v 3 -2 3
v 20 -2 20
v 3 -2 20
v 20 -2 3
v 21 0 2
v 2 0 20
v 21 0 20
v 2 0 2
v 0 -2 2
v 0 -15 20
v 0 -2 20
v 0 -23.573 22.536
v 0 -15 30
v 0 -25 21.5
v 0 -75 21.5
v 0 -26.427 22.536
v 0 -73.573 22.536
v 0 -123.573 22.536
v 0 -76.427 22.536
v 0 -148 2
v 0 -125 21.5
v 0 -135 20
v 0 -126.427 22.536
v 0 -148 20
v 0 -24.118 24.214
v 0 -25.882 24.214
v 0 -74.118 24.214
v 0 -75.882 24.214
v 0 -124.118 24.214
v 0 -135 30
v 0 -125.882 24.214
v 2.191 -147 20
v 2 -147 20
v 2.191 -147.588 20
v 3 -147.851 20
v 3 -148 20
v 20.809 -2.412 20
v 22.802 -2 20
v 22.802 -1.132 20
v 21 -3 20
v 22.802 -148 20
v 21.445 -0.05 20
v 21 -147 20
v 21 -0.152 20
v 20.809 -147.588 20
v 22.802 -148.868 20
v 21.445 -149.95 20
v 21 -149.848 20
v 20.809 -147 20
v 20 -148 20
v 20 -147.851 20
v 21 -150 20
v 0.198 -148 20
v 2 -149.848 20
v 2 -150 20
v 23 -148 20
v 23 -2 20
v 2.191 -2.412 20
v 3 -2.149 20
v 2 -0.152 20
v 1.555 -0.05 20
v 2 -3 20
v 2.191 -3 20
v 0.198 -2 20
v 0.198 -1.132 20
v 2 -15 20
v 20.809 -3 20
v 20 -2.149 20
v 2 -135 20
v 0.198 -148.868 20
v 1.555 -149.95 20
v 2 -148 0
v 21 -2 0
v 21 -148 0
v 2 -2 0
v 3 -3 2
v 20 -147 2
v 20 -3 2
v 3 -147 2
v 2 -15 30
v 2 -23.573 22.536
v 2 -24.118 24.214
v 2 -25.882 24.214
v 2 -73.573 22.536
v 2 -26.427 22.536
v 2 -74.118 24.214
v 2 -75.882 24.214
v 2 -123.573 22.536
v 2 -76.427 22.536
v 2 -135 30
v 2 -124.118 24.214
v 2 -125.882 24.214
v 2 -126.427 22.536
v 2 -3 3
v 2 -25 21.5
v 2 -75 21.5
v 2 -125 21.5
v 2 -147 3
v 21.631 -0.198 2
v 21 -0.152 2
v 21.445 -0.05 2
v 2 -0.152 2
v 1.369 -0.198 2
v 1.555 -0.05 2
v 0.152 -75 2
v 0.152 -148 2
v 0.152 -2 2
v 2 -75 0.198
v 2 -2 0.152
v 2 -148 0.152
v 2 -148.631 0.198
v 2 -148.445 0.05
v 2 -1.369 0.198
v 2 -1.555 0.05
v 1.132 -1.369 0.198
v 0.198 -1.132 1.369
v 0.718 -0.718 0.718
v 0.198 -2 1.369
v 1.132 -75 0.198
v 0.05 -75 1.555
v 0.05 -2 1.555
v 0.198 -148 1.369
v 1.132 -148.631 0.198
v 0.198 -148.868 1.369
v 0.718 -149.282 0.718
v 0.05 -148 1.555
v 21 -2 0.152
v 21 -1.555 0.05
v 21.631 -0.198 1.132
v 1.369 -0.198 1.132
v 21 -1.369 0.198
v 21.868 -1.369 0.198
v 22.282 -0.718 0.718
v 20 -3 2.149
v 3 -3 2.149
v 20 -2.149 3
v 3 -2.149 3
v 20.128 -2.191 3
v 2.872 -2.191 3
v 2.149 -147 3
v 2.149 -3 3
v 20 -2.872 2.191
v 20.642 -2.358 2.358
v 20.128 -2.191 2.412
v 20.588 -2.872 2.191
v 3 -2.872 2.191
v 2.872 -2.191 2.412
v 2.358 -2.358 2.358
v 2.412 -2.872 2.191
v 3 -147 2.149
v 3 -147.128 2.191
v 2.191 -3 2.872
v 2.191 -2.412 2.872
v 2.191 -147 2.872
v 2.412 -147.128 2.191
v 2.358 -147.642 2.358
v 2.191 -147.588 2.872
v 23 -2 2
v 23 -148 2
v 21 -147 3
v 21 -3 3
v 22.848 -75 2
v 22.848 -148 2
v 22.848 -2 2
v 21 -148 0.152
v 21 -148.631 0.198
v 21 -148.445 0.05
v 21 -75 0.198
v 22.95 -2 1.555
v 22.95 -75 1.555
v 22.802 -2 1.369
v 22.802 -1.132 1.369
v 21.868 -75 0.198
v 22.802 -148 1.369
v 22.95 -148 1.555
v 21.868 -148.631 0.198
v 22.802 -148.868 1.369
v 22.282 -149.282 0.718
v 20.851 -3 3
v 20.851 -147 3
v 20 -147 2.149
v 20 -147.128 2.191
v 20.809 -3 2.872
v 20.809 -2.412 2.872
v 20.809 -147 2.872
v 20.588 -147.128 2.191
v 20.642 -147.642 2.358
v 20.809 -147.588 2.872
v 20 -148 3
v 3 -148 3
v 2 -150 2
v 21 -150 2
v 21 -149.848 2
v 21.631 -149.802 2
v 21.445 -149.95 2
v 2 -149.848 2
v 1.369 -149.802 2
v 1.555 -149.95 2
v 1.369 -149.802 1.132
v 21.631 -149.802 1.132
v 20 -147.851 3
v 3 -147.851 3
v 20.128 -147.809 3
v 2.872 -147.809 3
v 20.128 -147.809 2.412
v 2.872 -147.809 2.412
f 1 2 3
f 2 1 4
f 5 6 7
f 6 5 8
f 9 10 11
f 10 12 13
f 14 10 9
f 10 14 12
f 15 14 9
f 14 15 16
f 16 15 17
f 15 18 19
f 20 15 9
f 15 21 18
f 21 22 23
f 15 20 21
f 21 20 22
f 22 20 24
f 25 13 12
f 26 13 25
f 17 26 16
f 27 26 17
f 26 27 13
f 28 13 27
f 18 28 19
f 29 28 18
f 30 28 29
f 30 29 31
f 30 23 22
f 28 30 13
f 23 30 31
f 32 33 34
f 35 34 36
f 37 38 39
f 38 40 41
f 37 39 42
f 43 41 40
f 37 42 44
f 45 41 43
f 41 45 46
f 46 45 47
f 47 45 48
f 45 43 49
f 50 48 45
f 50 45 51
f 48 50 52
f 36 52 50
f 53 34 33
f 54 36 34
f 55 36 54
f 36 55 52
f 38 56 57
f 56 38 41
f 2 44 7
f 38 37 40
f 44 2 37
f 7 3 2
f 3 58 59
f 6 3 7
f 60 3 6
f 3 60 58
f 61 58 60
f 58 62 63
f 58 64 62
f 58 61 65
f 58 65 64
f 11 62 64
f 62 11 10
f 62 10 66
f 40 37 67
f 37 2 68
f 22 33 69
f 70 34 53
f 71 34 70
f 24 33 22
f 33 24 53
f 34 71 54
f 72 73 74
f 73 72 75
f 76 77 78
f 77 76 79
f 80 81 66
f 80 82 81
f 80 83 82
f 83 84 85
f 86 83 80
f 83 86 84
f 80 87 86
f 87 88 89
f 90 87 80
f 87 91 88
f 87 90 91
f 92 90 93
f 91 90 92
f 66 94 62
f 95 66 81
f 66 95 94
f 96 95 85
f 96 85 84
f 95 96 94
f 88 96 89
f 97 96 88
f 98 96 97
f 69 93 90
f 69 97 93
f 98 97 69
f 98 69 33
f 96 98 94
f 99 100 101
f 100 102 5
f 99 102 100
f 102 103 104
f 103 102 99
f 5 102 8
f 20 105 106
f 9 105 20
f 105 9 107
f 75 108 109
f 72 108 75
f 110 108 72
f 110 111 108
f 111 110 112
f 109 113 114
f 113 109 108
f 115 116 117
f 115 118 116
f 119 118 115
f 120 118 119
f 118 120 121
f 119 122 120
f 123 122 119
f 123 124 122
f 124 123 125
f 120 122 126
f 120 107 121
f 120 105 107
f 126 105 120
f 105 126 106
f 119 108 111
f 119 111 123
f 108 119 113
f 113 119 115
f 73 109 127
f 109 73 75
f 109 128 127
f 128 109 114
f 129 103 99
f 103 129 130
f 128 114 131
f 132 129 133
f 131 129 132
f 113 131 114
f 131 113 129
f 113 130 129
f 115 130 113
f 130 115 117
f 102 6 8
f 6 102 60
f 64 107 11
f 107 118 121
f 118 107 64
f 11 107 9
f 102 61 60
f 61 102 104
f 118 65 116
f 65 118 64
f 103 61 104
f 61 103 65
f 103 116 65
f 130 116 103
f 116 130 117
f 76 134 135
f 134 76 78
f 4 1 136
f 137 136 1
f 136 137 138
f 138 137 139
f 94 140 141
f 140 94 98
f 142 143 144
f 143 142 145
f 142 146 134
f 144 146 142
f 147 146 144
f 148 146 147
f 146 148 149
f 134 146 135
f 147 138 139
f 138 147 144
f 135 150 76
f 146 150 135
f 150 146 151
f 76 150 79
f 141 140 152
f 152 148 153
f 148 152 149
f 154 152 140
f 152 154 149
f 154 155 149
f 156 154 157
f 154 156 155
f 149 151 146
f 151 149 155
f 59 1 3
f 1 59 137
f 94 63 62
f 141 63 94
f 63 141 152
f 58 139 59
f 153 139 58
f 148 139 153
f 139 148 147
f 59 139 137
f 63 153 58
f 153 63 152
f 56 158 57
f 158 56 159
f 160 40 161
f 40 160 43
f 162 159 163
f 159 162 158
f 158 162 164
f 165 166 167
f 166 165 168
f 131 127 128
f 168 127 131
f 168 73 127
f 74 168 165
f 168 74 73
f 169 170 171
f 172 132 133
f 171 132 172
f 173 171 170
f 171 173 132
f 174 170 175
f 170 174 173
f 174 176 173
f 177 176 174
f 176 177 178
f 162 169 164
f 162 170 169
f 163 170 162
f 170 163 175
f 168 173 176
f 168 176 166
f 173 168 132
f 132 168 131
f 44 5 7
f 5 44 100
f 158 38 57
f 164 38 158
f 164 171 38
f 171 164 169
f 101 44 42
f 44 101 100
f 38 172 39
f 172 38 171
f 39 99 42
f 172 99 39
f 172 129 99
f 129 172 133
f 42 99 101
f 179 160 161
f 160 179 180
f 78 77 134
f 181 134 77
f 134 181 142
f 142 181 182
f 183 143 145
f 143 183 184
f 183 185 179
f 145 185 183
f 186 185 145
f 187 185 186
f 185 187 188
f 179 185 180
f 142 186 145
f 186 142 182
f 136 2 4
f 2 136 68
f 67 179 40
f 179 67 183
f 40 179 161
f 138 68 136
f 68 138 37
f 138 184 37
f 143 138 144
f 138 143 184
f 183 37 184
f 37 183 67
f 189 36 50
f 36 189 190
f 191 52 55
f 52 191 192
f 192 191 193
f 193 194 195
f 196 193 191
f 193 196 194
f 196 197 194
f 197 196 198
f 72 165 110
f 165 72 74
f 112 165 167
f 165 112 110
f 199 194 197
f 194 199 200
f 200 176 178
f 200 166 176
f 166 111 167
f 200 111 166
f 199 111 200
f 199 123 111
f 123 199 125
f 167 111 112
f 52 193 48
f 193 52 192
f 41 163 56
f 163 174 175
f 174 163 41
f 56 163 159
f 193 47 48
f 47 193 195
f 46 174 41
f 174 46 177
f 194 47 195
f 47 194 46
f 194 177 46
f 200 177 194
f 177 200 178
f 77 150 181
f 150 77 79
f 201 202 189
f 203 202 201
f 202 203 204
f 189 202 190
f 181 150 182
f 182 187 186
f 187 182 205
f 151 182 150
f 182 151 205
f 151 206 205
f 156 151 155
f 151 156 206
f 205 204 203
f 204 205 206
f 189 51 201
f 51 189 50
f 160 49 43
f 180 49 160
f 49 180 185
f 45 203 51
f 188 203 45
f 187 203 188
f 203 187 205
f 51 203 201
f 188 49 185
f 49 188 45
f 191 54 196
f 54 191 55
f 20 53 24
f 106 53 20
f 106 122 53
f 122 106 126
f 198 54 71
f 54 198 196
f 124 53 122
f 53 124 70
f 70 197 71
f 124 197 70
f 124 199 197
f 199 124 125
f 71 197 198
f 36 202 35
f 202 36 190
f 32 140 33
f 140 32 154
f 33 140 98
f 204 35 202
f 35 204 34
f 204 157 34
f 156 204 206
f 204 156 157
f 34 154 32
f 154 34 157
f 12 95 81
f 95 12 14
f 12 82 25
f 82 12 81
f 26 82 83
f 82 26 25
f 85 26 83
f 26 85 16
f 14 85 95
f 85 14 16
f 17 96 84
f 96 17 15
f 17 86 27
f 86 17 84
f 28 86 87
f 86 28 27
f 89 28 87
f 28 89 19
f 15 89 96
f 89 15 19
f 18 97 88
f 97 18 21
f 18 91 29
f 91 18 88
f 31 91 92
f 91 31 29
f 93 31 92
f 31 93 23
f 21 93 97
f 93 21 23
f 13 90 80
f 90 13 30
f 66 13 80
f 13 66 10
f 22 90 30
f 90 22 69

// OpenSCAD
module corner_fill(len, thick)
{
    translate([0,-(thick / 2),-(thick / 2)]) difference()
    {
        cube([len,thick / 2, thick / 2]);
        rotate([0,90,0]) translate([0,0,-1]) cylinder(h=len + 2, d=thick);
    }
}

module corner_cut(len, thick)
{
    union()
    {
        corner_fill(len, thick);
        translate([0, -(thick / 2), 0])
            cube([len, (thick / 2) + 1, 1]);
        translate([0, 0, -(thick / 2)])
            cube([len, 1, (thick / 2) + 1]);
    }
}


module half_piece(face_h, width, thick, side)
{
        
    // face and top plate
    difference()
    {
        union()
        {
            translate([0,0,0]) cube([width, face_h, thick]);
            translate([0,0,0]) cube([width, thick, side]);
            translate([0,0,0]) cube([thick, face_h, side]);
        }
        union()
        {
            translate([0,0,-1]) rotate([0,-90,90])
                corner_cut(side + 2, 2 * thick);
            translate([0,0,0]) rotate ([180,0,0])
                corner_cut(width, 2 * thick);
            translate([0, -1, 0]) rotate([-90,0,90])
                corner_cut(face_h + 2, 2 * thick);
        }
    }

    translate([thick,thick,thick]) rotate ([180,0,0])
        corner_fill(width - thick, thick);
    translate([thick, thick, thick]) rotate([0,-90,90])
        corner_fill(side - thick, thick);
    translate([thick, thick, thick]) rotate([-90, 0,90])
        corner_fill(face_h - thick, thick);


}

module another_piece(face_h, width, thick, side)
{
    // left side
    translate([0,0,0])
        half_piece(face_h, width, thick, side);
    // right side
    translate([width * 2,0,0]) mirror ()
        half_piece(face_h, width, thick, side);
}

union()
{
    face_h = 20;
    thick = 2;
    side = 75;
    width = 11.5;
    offs = 15;
    ridge_h = 10;
    
    
    // left side
    translate([0,0,0]) rotate([90,0,0])
        another_piece(face_h, width, thick, side);
    // right side
    translate([width * 2,-side * 2,0]) rotate([90,0,180])
        another_piece(face_h, width, thick, side);
    
    difference()
    {
        translate([0, -2 * side + offs,face_h])
            cube([thick, 2 * (side - offs), ridge_h]);
        union()
        {
            translate([-1,-offs -10, face_h + 3])
                rotate([0,90,0])
                cylinder(d=3, h=thick + 2);
            translate([-1,-side, face_h + 3])
                rotate([0,90,0])
                cylinder(d=3, h=thick + 2);
            translate([-1,-2 * side + offs + 10, face_h + 3])
                rotate([0,90,0])
                cylinder(d=3, h=thick + 2);
        }
    }
}
